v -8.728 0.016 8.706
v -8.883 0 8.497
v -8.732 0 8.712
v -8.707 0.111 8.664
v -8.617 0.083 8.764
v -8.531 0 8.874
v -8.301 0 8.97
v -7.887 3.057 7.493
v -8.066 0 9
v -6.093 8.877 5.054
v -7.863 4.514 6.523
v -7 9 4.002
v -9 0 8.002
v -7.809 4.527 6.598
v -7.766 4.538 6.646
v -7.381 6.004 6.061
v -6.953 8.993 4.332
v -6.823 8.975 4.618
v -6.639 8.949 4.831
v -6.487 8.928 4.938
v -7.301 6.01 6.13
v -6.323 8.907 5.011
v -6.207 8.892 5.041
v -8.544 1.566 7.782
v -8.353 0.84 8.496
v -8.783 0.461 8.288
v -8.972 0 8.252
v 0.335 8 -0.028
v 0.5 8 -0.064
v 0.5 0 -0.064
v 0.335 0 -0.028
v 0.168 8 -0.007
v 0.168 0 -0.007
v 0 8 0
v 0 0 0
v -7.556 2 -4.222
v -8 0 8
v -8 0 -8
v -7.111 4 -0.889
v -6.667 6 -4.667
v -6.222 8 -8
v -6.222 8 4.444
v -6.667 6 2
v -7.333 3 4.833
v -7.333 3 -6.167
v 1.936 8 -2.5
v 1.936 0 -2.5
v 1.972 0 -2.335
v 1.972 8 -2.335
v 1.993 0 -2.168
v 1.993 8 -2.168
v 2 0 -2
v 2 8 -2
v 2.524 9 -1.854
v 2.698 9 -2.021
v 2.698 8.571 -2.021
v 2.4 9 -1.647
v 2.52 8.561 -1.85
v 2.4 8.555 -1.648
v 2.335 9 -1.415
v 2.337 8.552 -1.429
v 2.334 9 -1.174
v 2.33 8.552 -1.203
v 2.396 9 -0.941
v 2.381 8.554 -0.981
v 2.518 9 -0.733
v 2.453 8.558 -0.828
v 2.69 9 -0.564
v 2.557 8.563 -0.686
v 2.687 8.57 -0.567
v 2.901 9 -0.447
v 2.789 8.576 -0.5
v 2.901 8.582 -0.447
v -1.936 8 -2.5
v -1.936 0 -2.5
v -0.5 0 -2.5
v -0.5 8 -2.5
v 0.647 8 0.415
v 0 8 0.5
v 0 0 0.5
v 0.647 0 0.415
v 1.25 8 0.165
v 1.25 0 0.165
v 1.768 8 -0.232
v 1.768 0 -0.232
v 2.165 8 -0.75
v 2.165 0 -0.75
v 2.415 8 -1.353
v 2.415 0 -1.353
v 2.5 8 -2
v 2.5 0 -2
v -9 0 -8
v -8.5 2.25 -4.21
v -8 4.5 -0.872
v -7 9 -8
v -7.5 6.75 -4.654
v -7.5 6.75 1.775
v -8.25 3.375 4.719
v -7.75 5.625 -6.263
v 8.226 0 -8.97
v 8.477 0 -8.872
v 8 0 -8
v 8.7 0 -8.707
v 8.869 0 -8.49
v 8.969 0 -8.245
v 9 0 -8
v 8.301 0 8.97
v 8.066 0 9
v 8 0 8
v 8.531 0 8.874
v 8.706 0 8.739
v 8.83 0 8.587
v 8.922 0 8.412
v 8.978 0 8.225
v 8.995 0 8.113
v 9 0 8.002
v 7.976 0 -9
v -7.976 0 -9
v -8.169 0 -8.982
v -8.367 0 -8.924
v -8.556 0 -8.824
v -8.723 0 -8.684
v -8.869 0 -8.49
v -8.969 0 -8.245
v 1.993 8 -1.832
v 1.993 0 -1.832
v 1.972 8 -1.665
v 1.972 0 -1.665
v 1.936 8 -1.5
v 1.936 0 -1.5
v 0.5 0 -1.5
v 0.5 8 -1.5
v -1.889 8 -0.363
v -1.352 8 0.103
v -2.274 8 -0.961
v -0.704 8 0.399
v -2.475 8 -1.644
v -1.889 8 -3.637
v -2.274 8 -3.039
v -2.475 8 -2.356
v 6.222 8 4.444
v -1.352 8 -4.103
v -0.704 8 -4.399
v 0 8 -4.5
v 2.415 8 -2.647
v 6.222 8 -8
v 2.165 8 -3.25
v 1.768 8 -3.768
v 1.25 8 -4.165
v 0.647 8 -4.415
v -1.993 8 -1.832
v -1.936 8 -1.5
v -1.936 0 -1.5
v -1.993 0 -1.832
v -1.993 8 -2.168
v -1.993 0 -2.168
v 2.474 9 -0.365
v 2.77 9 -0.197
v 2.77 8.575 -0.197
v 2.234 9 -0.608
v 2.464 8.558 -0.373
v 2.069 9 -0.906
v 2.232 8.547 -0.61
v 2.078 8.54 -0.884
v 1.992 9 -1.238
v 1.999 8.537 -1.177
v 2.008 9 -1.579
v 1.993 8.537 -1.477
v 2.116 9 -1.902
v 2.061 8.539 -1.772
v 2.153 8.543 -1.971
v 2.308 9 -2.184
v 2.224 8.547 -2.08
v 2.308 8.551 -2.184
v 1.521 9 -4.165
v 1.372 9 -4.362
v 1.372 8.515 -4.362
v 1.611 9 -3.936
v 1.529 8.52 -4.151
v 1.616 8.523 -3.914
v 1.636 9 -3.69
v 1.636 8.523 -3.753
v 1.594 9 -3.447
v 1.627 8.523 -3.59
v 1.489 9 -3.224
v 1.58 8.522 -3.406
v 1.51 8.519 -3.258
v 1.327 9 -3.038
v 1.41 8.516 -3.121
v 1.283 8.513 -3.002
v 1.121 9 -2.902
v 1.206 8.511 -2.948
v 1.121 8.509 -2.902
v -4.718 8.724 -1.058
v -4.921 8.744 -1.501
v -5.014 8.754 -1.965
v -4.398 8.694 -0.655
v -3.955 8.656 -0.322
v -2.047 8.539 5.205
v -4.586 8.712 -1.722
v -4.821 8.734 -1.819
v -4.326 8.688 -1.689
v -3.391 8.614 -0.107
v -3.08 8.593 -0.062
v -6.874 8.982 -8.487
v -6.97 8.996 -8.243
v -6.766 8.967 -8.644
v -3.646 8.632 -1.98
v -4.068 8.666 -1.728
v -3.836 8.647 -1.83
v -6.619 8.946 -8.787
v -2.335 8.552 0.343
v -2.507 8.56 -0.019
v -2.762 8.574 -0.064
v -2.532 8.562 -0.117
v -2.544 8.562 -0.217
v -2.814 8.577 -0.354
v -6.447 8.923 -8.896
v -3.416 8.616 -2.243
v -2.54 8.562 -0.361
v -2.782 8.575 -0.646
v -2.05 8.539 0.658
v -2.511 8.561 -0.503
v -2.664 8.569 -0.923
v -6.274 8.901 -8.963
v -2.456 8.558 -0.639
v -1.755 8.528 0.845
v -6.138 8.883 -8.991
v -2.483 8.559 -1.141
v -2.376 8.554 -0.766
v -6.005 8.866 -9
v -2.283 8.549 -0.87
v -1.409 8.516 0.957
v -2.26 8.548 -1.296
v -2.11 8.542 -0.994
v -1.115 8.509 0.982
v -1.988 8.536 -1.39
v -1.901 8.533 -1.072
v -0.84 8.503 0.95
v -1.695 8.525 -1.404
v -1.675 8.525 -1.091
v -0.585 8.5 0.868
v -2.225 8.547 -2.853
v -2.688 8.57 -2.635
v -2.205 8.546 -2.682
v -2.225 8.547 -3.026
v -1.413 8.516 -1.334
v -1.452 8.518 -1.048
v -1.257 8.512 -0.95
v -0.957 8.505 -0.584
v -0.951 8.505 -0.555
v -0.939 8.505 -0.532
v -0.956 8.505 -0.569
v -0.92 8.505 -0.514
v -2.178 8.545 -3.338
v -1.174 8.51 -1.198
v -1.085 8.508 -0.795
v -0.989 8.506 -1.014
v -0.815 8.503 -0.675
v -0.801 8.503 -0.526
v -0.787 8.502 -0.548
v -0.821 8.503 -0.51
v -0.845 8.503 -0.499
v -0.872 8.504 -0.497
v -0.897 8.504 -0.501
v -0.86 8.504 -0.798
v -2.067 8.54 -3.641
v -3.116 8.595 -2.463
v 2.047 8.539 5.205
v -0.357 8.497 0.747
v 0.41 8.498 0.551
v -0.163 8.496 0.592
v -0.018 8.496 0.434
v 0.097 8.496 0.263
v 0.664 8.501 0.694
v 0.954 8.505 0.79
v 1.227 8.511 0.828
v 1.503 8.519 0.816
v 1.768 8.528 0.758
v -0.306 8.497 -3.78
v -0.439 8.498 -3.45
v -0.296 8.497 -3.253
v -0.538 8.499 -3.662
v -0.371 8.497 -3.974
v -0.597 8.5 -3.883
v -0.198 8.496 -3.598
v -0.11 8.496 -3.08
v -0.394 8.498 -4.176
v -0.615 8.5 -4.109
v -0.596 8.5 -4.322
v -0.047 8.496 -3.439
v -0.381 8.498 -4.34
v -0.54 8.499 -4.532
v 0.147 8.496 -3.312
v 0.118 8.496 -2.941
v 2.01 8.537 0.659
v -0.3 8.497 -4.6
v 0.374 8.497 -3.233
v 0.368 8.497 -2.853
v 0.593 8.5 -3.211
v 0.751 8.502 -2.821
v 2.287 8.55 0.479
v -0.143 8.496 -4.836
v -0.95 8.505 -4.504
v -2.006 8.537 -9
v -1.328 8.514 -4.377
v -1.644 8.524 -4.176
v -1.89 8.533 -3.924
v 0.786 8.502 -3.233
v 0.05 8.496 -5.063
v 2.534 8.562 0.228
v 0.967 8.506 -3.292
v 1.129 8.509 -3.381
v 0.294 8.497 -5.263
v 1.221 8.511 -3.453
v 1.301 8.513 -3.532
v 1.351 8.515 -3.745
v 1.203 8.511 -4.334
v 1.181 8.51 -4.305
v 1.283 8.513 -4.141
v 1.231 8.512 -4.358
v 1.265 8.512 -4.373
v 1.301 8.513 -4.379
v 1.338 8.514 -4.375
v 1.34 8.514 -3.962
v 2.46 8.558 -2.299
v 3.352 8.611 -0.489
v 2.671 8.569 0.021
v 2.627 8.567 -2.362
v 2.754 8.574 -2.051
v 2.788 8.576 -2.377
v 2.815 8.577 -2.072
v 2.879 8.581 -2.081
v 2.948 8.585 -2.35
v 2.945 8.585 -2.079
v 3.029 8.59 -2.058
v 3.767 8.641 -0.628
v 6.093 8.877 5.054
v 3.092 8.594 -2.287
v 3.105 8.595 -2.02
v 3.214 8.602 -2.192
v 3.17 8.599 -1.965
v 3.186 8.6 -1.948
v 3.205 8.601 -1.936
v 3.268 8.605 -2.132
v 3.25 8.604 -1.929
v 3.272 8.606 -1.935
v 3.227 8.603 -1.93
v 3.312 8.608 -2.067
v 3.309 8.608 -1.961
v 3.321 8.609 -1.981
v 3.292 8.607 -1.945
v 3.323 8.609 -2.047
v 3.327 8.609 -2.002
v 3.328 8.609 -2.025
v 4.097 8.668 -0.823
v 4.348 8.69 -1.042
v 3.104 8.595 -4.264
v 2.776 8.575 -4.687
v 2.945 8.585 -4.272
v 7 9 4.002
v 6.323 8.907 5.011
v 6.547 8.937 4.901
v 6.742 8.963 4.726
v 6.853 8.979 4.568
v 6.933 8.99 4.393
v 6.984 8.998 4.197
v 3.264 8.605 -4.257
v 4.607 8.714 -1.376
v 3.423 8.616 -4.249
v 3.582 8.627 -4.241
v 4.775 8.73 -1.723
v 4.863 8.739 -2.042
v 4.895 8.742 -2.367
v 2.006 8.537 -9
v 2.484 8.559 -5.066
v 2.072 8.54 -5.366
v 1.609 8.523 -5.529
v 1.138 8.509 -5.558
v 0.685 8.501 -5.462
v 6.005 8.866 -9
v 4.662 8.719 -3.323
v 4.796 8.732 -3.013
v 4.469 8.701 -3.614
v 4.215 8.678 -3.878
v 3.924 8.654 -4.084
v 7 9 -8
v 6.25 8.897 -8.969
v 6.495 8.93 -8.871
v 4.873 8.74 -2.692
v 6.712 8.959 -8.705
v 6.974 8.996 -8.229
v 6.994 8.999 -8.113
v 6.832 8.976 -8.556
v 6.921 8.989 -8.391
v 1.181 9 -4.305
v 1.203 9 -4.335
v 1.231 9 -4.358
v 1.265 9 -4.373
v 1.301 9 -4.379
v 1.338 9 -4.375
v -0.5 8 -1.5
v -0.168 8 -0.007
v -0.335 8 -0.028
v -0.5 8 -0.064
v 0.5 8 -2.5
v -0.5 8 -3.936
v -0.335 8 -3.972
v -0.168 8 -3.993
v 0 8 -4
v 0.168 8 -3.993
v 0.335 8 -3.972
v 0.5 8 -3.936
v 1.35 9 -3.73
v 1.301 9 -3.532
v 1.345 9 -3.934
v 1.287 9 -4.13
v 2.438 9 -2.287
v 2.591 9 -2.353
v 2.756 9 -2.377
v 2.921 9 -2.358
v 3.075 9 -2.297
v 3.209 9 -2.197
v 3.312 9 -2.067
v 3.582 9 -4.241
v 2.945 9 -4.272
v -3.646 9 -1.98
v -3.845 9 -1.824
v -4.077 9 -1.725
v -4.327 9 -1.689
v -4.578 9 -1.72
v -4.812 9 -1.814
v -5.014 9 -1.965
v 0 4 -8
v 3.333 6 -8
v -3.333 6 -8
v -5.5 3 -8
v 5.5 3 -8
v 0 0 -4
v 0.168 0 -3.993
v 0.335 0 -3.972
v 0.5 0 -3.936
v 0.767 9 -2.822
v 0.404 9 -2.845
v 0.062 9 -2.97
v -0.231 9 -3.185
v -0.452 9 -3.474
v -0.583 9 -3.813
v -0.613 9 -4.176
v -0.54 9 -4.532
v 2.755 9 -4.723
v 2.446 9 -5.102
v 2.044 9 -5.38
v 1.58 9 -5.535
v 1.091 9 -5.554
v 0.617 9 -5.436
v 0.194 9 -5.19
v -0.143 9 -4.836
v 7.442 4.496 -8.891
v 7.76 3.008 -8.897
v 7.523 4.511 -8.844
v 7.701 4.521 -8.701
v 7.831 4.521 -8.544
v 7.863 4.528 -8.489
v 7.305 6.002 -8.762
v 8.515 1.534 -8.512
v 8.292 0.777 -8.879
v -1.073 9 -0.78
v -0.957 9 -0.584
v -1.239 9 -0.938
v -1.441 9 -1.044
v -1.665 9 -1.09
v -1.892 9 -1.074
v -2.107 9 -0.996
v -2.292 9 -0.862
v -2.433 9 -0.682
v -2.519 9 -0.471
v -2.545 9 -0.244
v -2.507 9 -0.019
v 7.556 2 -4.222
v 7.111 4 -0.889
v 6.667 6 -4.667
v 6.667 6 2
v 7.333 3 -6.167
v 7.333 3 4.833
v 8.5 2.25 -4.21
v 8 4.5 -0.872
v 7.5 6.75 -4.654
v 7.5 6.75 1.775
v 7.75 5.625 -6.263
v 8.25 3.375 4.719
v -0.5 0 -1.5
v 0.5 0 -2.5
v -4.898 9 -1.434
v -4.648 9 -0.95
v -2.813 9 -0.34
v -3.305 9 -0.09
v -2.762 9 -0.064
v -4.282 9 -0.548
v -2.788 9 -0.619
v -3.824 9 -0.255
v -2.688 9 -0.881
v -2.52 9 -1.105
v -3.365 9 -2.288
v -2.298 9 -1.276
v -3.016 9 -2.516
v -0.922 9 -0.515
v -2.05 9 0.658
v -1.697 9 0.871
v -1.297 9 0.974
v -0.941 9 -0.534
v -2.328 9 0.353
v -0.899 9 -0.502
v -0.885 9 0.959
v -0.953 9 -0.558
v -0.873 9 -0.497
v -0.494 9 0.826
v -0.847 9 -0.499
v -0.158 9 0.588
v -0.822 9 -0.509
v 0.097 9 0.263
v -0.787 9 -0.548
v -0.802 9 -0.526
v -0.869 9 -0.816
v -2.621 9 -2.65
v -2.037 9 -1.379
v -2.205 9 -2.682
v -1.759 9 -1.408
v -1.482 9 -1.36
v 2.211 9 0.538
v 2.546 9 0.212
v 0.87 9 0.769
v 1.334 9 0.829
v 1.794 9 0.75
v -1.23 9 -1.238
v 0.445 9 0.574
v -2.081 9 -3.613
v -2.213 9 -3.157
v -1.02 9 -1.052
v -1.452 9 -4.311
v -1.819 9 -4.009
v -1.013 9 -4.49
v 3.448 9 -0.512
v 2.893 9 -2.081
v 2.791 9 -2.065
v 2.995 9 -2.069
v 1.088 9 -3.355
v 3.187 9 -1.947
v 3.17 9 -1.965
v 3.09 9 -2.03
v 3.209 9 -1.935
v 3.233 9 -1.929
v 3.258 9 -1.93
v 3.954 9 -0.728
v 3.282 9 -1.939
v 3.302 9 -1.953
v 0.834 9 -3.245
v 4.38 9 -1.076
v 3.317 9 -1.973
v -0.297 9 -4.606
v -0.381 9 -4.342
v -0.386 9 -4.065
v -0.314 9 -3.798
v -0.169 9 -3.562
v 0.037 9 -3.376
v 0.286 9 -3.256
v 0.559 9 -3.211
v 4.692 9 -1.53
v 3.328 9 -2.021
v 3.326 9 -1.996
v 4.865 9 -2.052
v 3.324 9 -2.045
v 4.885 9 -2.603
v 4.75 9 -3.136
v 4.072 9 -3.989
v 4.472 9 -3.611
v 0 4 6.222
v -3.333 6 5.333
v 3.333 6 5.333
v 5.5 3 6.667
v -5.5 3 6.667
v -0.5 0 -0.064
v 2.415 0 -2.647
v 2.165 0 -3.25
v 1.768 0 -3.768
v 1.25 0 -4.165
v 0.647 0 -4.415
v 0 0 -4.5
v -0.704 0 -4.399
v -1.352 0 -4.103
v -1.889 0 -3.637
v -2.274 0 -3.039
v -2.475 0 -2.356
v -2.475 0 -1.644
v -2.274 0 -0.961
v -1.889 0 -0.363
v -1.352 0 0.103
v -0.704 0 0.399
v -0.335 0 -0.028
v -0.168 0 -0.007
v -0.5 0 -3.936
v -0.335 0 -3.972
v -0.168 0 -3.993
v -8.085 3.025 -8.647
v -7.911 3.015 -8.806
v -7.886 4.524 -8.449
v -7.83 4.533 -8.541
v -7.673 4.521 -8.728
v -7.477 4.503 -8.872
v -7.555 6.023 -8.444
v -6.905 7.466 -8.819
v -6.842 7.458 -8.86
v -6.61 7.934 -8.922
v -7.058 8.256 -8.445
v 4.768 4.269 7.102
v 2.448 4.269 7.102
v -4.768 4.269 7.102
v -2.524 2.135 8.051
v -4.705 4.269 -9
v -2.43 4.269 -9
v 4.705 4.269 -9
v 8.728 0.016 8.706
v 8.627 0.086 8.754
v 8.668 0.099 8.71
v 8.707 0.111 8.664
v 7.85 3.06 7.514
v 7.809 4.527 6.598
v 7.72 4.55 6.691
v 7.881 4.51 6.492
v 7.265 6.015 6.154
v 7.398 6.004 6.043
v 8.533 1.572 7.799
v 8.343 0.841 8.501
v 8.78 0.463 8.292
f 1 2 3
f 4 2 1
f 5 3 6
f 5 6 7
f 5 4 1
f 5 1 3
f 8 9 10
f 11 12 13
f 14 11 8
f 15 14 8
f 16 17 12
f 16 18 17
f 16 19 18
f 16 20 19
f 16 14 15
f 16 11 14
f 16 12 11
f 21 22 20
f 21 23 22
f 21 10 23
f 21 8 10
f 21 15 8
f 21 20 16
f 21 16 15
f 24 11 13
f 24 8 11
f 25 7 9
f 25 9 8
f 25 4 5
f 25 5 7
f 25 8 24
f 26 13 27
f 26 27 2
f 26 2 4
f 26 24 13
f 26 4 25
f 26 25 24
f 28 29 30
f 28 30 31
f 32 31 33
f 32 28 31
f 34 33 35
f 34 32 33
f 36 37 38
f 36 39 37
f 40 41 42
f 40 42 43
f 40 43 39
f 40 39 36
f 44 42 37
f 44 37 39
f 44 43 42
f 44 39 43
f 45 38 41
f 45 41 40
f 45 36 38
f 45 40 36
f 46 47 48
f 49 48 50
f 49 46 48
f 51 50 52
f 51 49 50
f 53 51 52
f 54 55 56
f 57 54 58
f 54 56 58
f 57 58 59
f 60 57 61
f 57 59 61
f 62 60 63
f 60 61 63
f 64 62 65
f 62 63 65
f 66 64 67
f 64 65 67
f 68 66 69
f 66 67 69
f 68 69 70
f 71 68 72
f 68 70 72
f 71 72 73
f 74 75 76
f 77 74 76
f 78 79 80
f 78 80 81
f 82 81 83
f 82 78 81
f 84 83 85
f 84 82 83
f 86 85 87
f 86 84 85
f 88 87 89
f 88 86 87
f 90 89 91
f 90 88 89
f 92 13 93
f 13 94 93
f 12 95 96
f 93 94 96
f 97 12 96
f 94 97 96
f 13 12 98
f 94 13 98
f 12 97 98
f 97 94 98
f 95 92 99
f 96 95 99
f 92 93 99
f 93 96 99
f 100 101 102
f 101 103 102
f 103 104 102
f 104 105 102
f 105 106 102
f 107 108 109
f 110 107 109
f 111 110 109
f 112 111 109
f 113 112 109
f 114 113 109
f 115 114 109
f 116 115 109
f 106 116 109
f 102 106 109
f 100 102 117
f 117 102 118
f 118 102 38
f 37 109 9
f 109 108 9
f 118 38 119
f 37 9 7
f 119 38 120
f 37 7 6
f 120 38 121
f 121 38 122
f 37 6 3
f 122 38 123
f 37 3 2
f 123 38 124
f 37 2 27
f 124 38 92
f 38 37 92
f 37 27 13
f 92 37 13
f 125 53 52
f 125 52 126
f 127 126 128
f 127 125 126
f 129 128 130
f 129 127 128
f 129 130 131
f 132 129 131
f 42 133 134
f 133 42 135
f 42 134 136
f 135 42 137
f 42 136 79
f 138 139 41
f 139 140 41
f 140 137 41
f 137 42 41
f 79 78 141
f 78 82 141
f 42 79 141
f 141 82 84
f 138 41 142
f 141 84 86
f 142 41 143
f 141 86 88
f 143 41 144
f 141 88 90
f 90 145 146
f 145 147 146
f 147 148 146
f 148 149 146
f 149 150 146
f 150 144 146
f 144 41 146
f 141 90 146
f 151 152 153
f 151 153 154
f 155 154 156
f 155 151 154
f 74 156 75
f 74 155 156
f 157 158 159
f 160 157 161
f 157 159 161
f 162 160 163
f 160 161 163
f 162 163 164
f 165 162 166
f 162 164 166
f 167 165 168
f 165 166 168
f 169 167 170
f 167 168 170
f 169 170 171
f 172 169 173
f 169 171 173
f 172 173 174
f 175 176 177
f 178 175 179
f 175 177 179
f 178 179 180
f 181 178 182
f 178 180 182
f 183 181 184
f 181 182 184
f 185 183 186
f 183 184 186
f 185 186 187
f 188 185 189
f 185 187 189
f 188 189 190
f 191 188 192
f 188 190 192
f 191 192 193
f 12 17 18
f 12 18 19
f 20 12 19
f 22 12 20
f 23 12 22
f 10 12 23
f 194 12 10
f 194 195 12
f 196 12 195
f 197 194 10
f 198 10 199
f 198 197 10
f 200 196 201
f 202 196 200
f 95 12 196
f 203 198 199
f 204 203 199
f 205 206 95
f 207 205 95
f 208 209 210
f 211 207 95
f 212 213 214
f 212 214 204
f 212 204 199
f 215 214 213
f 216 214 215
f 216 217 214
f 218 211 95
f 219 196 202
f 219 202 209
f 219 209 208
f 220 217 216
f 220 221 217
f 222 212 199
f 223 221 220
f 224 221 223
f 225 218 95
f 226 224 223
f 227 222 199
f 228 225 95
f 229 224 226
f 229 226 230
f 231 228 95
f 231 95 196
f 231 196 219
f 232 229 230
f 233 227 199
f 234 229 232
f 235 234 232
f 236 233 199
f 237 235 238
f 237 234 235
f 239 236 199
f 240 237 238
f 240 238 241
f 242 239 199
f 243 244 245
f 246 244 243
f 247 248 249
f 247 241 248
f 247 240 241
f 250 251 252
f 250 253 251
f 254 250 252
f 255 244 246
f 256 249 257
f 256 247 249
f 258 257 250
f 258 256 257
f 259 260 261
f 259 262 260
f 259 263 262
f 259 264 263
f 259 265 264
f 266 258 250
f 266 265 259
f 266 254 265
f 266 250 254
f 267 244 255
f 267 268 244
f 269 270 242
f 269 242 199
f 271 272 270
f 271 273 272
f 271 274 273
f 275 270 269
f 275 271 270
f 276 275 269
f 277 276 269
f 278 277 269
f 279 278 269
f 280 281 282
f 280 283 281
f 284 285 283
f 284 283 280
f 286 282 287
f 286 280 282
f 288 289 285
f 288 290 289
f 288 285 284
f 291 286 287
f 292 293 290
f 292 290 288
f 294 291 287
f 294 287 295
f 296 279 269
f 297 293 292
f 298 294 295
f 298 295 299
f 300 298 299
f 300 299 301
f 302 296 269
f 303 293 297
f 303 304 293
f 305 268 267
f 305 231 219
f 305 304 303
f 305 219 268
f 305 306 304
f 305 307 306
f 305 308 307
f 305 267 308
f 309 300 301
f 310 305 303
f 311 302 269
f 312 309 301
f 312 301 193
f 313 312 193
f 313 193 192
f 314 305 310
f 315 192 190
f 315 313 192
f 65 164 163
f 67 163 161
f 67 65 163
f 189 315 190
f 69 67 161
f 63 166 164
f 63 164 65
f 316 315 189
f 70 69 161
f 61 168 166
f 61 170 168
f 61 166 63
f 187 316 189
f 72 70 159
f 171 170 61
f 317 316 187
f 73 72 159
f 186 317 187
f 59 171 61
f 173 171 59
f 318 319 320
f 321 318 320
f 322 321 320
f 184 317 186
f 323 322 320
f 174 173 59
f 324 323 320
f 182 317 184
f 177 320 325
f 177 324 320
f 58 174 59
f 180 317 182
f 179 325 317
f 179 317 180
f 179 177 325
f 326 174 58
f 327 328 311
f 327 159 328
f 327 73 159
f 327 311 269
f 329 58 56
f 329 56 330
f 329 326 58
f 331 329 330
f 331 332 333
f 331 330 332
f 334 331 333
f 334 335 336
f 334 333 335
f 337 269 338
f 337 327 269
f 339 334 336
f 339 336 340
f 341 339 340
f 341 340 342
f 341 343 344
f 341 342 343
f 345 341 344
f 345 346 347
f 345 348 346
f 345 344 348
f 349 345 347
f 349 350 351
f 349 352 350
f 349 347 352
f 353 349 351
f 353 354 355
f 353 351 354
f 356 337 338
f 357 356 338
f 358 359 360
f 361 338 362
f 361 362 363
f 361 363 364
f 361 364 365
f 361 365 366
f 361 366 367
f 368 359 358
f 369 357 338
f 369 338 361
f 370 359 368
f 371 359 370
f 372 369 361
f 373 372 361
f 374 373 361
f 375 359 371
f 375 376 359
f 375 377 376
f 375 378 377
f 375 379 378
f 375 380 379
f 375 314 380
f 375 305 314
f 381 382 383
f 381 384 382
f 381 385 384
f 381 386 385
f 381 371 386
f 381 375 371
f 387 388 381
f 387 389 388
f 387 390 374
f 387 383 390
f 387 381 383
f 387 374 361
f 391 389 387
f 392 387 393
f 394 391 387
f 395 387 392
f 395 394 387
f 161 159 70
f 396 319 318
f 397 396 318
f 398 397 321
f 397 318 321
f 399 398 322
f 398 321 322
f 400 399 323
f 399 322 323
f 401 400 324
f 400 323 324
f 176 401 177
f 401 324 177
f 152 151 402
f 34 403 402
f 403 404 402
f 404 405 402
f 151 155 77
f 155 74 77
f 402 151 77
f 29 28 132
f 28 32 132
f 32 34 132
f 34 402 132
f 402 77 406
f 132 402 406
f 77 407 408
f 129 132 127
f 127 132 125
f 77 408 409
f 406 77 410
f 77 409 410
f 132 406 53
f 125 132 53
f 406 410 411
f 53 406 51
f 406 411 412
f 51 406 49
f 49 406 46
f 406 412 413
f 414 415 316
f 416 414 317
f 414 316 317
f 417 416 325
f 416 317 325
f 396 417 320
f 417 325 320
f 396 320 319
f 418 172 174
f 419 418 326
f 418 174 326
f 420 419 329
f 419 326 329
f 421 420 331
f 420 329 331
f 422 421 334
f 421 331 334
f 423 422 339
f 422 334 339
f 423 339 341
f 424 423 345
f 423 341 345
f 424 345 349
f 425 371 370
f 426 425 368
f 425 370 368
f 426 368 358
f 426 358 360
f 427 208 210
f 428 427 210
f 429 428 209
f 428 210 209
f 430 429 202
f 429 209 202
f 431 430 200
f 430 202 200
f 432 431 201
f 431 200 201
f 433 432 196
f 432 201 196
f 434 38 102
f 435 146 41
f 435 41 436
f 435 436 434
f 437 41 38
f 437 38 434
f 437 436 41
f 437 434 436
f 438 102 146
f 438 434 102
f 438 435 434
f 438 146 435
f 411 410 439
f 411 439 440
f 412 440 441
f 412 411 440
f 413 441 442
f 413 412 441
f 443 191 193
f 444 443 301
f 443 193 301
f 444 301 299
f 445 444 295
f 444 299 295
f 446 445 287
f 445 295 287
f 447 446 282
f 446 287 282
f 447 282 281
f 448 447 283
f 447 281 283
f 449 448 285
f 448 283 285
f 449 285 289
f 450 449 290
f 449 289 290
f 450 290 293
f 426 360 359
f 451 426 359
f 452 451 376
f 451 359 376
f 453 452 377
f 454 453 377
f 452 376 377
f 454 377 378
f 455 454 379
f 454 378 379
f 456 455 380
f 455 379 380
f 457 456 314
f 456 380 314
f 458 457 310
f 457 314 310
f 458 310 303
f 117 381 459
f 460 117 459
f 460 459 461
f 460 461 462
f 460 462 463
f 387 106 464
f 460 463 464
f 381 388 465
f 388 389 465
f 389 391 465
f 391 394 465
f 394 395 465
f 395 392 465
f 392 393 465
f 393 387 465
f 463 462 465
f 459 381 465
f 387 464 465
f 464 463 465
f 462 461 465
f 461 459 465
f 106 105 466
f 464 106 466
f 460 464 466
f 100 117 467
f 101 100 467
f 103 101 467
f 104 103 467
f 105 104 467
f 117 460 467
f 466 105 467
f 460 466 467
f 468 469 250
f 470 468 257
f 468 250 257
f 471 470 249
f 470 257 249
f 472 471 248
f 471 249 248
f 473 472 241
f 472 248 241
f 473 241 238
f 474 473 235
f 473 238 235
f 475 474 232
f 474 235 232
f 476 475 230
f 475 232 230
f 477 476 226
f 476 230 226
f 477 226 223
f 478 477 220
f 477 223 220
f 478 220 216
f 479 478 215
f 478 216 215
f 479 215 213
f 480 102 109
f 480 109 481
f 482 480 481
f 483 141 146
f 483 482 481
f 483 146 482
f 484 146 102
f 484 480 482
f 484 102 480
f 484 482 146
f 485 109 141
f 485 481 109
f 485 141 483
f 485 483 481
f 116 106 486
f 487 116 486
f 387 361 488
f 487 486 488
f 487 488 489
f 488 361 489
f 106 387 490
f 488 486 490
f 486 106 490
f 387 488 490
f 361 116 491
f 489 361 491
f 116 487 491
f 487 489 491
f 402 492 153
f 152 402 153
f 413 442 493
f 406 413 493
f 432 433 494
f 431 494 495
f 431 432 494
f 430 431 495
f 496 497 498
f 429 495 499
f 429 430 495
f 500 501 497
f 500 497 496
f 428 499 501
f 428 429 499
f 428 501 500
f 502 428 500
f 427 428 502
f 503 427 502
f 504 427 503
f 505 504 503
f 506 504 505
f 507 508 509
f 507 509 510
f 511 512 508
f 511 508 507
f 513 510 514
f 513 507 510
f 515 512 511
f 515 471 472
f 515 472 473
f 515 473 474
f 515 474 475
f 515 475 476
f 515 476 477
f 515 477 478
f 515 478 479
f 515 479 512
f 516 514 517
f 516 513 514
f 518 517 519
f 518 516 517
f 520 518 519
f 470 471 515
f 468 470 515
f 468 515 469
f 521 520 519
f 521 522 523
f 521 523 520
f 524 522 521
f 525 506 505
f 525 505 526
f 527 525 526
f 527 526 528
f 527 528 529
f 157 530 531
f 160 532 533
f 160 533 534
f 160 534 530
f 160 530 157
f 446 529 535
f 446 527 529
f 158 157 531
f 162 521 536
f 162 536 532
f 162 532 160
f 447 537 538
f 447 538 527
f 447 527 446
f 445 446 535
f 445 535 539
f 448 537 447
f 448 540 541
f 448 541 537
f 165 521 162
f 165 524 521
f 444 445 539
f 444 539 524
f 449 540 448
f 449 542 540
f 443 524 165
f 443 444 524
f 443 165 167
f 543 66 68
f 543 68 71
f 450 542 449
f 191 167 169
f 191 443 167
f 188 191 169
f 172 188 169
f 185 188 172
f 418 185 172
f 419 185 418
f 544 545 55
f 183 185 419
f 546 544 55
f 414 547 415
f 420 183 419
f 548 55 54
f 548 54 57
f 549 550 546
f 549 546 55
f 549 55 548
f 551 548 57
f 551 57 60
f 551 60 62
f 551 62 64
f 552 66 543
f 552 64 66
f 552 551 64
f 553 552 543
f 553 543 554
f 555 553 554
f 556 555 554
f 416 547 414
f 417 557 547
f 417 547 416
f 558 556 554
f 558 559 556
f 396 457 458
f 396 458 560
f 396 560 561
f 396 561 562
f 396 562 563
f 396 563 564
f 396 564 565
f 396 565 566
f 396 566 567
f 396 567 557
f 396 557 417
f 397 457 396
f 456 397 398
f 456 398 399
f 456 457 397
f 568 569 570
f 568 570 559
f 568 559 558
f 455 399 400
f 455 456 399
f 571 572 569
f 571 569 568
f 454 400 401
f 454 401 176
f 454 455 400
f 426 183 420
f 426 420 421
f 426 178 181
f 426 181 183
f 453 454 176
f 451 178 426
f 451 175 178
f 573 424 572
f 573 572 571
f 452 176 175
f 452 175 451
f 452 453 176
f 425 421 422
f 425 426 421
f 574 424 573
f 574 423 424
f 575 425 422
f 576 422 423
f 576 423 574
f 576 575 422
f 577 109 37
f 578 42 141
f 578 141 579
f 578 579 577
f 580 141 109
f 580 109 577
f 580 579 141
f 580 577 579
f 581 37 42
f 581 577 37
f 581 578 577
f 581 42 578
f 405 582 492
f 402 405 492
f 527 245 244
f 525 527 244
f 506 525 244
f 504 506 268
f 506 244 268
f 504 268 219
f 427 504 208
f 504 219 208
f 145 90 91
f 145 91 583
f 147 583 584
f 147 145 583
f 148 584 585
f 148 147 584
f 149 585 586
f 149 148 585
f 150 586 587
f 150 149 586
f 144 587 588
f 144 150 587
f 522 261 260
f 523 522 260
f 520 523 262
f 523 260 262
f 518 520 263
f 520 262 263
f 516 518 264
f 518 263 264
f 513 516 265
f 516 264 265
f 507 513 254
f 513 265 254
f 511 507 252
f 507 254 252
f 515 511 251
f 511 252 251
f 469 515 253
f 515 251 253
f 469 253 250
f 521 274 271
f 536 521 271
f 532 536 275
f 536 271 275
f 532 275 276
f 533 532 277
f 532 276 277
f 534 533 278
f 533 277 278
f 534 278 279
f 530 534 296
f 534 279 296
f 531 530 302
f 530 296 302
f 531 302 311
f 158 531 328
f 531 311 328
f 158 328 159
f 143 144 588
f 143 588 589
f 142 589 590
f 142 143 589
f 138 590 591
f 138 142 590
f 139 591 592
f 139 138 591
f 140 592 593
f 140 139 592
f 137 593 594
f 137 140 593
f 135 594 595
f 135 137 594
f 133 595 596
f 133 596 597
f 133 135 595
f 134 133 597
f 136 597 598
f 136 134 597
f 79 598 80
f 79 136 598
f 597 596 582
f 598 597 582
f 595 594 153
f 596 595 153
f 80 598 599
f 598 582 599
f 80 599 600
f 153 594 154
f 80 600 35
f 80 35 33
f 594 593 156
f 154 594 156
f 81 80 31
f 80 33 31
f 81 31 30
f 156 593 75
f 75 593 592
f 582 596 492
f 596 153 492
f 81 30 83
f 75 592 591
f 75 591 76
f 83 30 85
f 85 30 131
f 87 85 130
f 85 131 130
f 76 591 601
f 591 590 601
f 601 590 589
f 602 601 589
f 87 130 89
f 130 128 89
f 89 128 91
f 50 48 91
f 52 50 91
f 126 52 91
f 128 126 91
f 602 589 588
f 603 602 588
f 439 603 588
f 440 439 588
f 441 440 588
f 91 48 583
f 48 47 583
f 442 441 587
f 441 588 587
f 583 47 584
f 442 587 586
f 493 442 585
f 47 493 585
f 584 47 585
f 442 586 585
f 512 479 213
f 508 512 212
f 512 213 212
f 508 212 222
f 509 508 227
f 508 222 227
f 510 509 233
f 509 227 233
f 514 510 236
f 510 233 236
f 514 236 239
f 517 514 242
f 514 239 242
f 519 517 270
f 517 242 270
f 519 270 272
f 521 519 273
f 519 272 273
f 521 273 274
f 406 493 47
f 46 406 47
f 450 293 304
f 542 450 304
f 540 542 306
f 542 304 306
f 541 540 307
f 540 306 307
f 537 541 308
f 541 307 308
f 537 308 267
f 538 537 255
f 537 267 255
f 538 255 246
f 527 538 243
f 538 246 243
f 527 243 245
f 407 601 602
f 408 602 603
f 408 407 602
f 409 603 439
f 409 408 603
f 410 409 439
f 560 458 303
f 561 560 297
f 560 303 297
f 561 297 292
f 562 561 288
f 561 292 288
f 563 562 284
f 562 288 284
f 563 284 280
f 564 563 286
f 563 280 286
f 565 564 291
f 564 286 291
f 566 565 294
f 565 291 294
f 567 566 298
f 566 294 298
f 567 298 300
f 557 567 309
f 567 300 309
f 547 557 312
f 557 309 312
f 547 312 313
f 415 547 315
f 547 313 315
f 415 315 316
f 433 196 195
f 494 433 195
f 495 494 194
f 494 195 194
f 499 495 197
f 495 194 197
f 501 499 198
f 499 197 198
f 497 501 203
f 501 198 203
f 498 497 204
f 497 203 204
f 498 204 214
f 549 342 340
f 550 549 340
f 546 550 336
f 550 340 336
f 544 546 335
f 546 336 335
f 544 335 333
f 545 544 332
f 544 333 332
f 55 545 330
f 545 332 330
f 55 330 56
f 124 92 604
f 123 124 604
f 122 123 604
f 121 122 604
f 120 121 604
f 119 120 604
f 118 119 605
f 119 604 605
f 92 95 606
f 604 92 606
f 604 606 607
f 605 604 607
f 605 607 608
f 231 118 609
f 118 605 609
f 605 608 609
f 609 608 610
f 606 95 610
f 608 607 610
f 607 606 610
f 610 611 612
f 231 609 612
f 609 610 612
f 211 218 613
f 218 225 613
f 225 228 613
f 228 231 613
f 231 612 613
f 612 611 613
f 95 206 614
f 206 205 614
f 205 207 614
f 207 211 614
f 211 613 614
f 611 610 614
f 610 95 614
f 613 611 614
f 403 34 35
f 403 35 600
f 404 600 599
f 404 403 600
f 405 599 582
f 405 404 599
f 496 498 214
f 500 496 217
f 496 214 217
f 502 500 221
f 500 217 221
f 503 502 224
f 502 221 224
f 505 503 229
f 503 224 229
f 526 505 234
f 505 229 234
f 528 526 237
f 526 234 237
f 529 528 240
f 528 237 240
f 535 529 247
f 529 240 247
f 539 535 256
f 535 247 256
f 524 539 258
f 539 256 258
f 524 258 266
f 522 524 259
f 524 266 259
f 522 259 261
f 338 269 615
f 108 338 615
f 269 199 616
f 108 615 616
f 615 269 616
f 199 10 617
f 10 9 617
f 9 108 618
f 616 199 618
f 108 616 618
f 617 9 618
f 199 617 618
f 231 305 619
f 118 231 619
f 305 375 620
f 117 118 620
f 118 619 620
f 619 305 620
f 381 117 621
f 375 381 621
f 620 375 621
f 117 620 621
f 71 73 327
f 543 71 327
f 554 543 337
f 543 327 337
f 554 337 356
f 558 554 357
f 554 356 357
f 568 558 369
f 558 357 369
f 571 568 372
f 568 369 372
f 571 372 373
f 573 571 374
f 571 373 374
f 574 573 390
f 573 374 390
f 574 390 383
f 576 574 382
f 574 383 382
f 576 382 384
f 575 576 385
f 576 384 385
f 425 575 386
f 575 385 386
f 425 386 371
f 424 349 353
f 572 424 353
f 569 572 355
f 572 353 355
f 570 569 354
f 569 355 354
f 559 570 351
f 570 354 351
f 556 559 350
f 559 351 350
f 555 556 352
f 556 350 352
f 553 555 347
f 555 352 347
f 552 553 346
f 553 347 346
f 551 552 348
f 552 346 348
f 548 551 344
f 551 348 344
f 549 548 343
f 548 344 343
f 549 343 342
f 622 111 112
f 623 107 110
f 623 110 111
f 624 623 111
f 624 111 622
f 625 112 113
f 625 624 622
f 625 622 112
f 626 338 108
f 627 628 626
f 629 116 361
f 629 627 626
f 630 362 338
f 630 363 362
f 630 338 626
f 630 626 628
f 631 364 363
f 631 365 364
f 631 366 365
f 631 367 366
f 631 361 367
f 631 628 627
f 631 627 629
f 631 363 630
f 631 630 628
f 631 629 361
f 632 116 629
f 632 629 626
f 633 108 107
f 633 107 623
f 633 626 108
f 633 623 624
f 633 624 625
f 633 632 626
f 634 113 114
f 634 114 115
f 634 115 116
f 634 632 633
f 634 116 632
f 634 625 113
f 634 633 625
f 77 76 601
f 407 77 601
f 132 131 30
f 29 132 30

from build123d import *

# Parameters (mm, degrees)
BOSS_EXTRUDE1_DEPTH = 1
BOSS_EXTRUDE2_START = -1
BOSS_EXTRUDE2_DEPTH = 8
CUT_EXTRUDE1_DEPTH  = 18
FILLET2_R           = 1
BOSS_EXTRUDE3_START = 8
BOSS_EXTRUDE3_DEPTH = 1


with BuildPart() as part:
    # Sketch1 → Loft2 section 0
    with BuildSketch(Plane(origin=(0, 0, 0), x_dir=(1, 0, 0), z_dir=(0, 1, 0))):
        with BuildLine():
            Line((9, -9), (-9, -9))
            Line((-9, -9), (-9, 9))
            Line((-9, 9), (9, 9))
            Line((9, 9), (9, -9))
        make_face()
    # Sketch3 → Loft2 section 1
    with BuildSketch(Plane(origin=(0, 9, 0), x_dir=(1, 0, 0), z_dir=(0, 1, 0))):
        with BuildLine():
            Line((0, 9), (-7, 9))
            Line((-7, 9), (-7, -5))
            Line((-7, -5), (7, -5))
            Line((7, -5), (7, 9))
            Line((7, 9), (0, 9))
        make_face()
    loft()

    # Cut-Loft3: read off the stored shape, not the designer's step
    # Cut-Loft3: loft between two sections, ruled curve by curve
    cut_loft3_from = [
        Edge.make_line((8, 0, -8), (8, 0, 8)),
        Edge.make_line((-8, 0, -8), (8, 0, -8)),
        Edge.make_line((-8, 0, 8), (-8, 0, -8)),
        Edge.make_line((8, 0, 8), (-8, 0, 8)),
    ]
    cut_loft3_to = [
        Edge.make_line((6, 9, -8), (6, 9, 4)),
        Edge.make_line((-6, 9, -8), (6, 9, -8)),
        Edge.make_line((-6, 9, 4), (-6, 9, -8)),
        Edge.make_line((6, 9, 4), (-6, 9, 4)),
    ]
    cut_loft3 = Solid(Shell([*[Face.make_surface_from_curves(cut_loft3_from[k], cut_loft3_to[k]) for k in range(4)], Face(Wire(cut_loft3_from)), Face(Wire(cut_loft3_to))]))
    add(cut_loft3, mode=Mode.SUBTRACT)

    # Sketch3<8> → Boss-Extrude1 (add)
    with BuildSketch(Plane(origin=(0, 9, 0), x_dir=(1, 0, 0), z_dir=(0, 1, 0))):
        Polygon((0, 9), (-7, 9), (-7, -5), (7, -5), (7, 9), align=None)
    extrude(amount=-BOSS_EXTRUDE1_DEPTH)

    # Sketch9 → Boss-Extrude2 (add)
    with BuildSketch(Plane(origin=(0, 9, 0), x_dir=(1, 0, 0), z_dir=(0, 1, 0)).offset(BOSS_EXTRUDE2_START)):
        with BuildLine():
            ThreePointArc((2.5, 2), (1.767766953, 3.767766953), (0, 4.5))
            Line((0, 4.5), (0, 4))
            ThreePointArc((0, 4), (0.252008585, 3.984059393), (0.5, 3.936491673))
            ThreePointArc((0.5, 3.936491673), (1.414213562, 3.414213562), (1.936491673, 2.5))
            ThreePointArc((1.936491673, 2.5), (1.984059393, 2.252008585), (2, 2))
            ThreePointArc((2, 2), (1.984059393, 1.747991415), (1.936491673, 1.5))
            ThreePointArc((1.936491673, 1.5), (1.414213562, 0.585786438), (0.5, 0.063508327))
            ThreePointArc((0.5, 0.063508327), (0.252008585, 0.015940607), (0, 0))
            Line((0, 0), (0, -0.5))
            ThreePointArc((0, -0.5), (1.767766953, 0.232233047), (2.5, 2))
        make_face()
        with BuildLine():
            Line((0, 4), (0, 4.5))
            ThreePointArc((0, 4.5), (-2.5, 2), (0, -0.5))
            Line((0, -0.5), (0, 0))
            ThreePointArc((0, 0), (-0.252008585, 0.015940607), (-0.5, 0.063508327))
            ThreePointArc((-0.5, 0.063508327), (-1.414213562, 0.585786438), (-1.936491673, 1.5))
            ThreePointArc((-1.936491673, 1.5), (-2, 2), (-1.936491673, 2.5))
            ThreePointArc((-1.936491673, 2.5), (-1.414213562, 3.414213562), (-0.5, 3.936491673))
            ThreePointArc((-0.5, 3.936491673), (-0.252008585, 3.984059393), (0, 4))
        make_face()
        with BuildLine():
            Line((-0.5, 2.5), (-0.5, 3.936491673))
            ThreePointArc((-0.5, 3.936491673), (-1.414213562, 3.414213562), (-1.936491673, 2.5))
            Line((-1.936491673, 2.5), (-0.5, 2.5))
        make_face()
        with BuildLine():
            ThreePointArc((1.936491673, 2.5), (1.414213562, 3.414213562), (0.5, 3.936491673))
            Line((0.5, 3.936491673), (0.5, 2.5))
            Line((0.5, 2.5), (1.936491673, 2.5))
        make_face()
        with BuildLine():
            Line((0.5, 1.5), (0.5, 0.063508327))
            ThreePointArc((0.5, 0.063508327), (1.414213562, 0.585786438), (1.936491673, 1.5))
            Line((1.936491673, 1.5), (0.5, 1.5))
        make_face()
        with BuildLine():
            ThreePointArc((-1.936491673, 1.5), (-1.414213562, 0.585786438), (-0.5, 0.063508327))
            Line((-0.5, 0.063508327), (-0.5, 1.5))
            Line((-0.5, 1.5), (-1.936491673, 1.5))
        make_face()
    extrude(amount=-BOSS_EXTRUDE2_DEPTH)

    # Sketch10 → Cut-Extrude1 (cut)
    with BuildSketch(Plane(origin=(0, 0, -9), x_dir=(-1, 0, 0), z_dir=(0, 0, -1))):
        with BuildLine():
            Line((-7, 9), (7, 9))
            ThreePointArc((7, 9), (0, 8.4960195), (-7, 9))
        make_face()
    extrude(amount=-CUT_EXTRUDE1_DEPTH, mode=Mode.SUBTRACT)

    # Fillet2
    fillet2_edges = [part.edges().sort_by_distance(p)[0] for p in [
        (-8, 4.5, -9),
        (8, 4.5, -9),
        (8, 4.5, 7),
        (-8, 4.5, 7),
    ]]
    fillet(fillet2_edges, radius=FILLET2_R)

    # Sketch12 → Boss-Extrude3 (add)
    with BuildSketch(Plane(origin=(0, 0, 0), x_dir=(1, 0, 0), z_dir=(0, 1, 0)).offset(BOSS_EXTRUDE3_START)):
        with BuildLine():
            Line((3.581786245, 4.240596222), (2.945334125, 4.272419097))
            ThreePointArc((2.945334125, 4.272419097), (1.580068464, 5.534847266), (-0.142959574, 4.835669471))
            ThreePointArc((-0.142959574, 4.835669471), (-0.072742065, 3.461690437), (1.301236968, 3.531907946))
            ThreePointArc((1.301236968, 3.531907946), (1.344877857, 3.934460155), (1.181086076, 4.304764166))
            ThreePointArc((1.181086076, 4.304764166), (1.26486543, 4.372930475), (1.372307239, 4.361890385))
            ThreePointArc((1.372307239, 4.361890385), (1.623671348, 3.567376067), (1.121377086, 2.902441943))
            ThreePointArc((1.121377086, 2.902441943), (-0.231414775, 3.184828144), (-0.539737114, 4.531945481))
            ThreePointArc((-0.539737114, 4.531945481), (-1.819279995, 4.009007276), (-2.205376195, 2.681745404))
            ThreePointArc((-2.205376195, 2.681745404), (-3.016060665, 2.51631725), (-3.646364404, 1.980320066))
            ThreePointArc((-3.646364404, 1.980320066), (-4.327119044, 1.689455161), (-5.014157813, 1.965148837))
            ThreePointArc((-5.014157813, 1.965148837), (-4.281658635, 0.548246446), (-2.76180221, 0.064300293))
            ThreePointArc((-2.76180221, 0.064300293), (-2.037336191, 1.379203145), (-0.787003641, 0.548246446))
            ThreePointArc((-0.787003641, 0.548246446), (-0.886204145, 0.498401478), (-0.957055057, 0.583873164))
            ThreePointArc((-0.957055057, 0.583873164), (-2.00225835, 1.042077327), (-2.507207587, 0.018638396))
            ThreePointArc((-2.507207587, 0.018638396), (-1.297421649, -0.973910564), (0.096724797, -0.26321292))
            ThreePointArc((0.096724797, -0.26321292), (1.566904433, -0.806570536), (2.770449564, 0.197493596))
            ThreePointArc((2.770449564, 0.197493596), (2.019360199, 1.069566472), (2.30803646, 2.183708451))
            ThreePointArc((2.30803646, 2.183708451), (2.838720645, 2.372686483), (3.312040204, 2.067224545))
            ThreePointArc((3.312040204, 2.067224545), (3.292128592, 1.945237225), (3.170141272, 1.965148837))
            ThreePointArc((3.170141272, 1.965148837), (2.944061172, 2.078913386), (2.697636855, 2.021210346))
            ThreePointArc((2.697636855, 2.021210346), (2.333692103, 1.174003789), (2.901024067, 0.447127475))
            ThreePointArc((2.901024067, 0.447127475), (4.865037055, 2.052490742), (3.581786245, 4.240596222))
        make_face()
    extrude(amount=BOSS_EXTRUDE3_DEPTH)


solid = part.part
